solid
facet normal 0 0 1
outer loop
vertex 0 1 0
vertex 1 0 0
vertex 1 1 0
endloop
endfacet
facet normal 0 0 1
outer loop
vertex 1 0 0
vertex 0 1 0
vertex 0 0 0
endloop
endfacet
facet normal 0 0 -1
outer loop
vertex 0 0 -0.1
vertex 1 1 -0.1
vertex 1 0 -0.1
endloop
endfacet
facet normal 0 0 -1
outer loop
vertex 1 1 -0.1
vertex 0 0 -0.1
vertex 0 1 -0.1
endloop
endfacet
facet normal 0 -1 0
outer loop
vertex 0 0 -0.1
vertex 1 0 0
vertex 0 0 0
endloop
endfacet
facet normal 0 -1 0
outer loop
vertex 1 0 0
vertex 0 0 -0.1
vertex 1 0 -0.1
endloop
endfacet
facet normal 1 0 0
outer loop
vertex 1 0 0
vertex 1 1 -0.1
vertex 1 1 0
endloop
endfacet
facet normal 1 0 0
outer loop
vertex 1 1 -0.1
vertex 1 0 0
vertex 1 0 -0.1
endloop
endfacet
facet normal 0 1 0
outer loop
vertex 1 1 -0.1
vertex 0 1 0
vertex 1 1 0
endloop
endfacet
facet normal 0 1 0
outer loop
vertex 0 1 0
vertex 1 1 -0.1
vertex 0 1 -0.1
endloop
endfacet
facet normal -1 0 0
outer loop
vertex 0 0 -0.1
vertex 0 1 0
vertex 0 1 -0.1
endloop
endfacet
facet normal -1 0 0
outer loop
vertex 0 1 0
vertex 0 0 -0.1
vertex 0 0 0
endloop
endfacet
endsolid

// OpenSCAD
module theFloor(){
  color([0,0.6,0])
  render(convexity=1)
  translate([0,0,-0.1])
  cube([1,1,0.1]);
}

theFloor();
